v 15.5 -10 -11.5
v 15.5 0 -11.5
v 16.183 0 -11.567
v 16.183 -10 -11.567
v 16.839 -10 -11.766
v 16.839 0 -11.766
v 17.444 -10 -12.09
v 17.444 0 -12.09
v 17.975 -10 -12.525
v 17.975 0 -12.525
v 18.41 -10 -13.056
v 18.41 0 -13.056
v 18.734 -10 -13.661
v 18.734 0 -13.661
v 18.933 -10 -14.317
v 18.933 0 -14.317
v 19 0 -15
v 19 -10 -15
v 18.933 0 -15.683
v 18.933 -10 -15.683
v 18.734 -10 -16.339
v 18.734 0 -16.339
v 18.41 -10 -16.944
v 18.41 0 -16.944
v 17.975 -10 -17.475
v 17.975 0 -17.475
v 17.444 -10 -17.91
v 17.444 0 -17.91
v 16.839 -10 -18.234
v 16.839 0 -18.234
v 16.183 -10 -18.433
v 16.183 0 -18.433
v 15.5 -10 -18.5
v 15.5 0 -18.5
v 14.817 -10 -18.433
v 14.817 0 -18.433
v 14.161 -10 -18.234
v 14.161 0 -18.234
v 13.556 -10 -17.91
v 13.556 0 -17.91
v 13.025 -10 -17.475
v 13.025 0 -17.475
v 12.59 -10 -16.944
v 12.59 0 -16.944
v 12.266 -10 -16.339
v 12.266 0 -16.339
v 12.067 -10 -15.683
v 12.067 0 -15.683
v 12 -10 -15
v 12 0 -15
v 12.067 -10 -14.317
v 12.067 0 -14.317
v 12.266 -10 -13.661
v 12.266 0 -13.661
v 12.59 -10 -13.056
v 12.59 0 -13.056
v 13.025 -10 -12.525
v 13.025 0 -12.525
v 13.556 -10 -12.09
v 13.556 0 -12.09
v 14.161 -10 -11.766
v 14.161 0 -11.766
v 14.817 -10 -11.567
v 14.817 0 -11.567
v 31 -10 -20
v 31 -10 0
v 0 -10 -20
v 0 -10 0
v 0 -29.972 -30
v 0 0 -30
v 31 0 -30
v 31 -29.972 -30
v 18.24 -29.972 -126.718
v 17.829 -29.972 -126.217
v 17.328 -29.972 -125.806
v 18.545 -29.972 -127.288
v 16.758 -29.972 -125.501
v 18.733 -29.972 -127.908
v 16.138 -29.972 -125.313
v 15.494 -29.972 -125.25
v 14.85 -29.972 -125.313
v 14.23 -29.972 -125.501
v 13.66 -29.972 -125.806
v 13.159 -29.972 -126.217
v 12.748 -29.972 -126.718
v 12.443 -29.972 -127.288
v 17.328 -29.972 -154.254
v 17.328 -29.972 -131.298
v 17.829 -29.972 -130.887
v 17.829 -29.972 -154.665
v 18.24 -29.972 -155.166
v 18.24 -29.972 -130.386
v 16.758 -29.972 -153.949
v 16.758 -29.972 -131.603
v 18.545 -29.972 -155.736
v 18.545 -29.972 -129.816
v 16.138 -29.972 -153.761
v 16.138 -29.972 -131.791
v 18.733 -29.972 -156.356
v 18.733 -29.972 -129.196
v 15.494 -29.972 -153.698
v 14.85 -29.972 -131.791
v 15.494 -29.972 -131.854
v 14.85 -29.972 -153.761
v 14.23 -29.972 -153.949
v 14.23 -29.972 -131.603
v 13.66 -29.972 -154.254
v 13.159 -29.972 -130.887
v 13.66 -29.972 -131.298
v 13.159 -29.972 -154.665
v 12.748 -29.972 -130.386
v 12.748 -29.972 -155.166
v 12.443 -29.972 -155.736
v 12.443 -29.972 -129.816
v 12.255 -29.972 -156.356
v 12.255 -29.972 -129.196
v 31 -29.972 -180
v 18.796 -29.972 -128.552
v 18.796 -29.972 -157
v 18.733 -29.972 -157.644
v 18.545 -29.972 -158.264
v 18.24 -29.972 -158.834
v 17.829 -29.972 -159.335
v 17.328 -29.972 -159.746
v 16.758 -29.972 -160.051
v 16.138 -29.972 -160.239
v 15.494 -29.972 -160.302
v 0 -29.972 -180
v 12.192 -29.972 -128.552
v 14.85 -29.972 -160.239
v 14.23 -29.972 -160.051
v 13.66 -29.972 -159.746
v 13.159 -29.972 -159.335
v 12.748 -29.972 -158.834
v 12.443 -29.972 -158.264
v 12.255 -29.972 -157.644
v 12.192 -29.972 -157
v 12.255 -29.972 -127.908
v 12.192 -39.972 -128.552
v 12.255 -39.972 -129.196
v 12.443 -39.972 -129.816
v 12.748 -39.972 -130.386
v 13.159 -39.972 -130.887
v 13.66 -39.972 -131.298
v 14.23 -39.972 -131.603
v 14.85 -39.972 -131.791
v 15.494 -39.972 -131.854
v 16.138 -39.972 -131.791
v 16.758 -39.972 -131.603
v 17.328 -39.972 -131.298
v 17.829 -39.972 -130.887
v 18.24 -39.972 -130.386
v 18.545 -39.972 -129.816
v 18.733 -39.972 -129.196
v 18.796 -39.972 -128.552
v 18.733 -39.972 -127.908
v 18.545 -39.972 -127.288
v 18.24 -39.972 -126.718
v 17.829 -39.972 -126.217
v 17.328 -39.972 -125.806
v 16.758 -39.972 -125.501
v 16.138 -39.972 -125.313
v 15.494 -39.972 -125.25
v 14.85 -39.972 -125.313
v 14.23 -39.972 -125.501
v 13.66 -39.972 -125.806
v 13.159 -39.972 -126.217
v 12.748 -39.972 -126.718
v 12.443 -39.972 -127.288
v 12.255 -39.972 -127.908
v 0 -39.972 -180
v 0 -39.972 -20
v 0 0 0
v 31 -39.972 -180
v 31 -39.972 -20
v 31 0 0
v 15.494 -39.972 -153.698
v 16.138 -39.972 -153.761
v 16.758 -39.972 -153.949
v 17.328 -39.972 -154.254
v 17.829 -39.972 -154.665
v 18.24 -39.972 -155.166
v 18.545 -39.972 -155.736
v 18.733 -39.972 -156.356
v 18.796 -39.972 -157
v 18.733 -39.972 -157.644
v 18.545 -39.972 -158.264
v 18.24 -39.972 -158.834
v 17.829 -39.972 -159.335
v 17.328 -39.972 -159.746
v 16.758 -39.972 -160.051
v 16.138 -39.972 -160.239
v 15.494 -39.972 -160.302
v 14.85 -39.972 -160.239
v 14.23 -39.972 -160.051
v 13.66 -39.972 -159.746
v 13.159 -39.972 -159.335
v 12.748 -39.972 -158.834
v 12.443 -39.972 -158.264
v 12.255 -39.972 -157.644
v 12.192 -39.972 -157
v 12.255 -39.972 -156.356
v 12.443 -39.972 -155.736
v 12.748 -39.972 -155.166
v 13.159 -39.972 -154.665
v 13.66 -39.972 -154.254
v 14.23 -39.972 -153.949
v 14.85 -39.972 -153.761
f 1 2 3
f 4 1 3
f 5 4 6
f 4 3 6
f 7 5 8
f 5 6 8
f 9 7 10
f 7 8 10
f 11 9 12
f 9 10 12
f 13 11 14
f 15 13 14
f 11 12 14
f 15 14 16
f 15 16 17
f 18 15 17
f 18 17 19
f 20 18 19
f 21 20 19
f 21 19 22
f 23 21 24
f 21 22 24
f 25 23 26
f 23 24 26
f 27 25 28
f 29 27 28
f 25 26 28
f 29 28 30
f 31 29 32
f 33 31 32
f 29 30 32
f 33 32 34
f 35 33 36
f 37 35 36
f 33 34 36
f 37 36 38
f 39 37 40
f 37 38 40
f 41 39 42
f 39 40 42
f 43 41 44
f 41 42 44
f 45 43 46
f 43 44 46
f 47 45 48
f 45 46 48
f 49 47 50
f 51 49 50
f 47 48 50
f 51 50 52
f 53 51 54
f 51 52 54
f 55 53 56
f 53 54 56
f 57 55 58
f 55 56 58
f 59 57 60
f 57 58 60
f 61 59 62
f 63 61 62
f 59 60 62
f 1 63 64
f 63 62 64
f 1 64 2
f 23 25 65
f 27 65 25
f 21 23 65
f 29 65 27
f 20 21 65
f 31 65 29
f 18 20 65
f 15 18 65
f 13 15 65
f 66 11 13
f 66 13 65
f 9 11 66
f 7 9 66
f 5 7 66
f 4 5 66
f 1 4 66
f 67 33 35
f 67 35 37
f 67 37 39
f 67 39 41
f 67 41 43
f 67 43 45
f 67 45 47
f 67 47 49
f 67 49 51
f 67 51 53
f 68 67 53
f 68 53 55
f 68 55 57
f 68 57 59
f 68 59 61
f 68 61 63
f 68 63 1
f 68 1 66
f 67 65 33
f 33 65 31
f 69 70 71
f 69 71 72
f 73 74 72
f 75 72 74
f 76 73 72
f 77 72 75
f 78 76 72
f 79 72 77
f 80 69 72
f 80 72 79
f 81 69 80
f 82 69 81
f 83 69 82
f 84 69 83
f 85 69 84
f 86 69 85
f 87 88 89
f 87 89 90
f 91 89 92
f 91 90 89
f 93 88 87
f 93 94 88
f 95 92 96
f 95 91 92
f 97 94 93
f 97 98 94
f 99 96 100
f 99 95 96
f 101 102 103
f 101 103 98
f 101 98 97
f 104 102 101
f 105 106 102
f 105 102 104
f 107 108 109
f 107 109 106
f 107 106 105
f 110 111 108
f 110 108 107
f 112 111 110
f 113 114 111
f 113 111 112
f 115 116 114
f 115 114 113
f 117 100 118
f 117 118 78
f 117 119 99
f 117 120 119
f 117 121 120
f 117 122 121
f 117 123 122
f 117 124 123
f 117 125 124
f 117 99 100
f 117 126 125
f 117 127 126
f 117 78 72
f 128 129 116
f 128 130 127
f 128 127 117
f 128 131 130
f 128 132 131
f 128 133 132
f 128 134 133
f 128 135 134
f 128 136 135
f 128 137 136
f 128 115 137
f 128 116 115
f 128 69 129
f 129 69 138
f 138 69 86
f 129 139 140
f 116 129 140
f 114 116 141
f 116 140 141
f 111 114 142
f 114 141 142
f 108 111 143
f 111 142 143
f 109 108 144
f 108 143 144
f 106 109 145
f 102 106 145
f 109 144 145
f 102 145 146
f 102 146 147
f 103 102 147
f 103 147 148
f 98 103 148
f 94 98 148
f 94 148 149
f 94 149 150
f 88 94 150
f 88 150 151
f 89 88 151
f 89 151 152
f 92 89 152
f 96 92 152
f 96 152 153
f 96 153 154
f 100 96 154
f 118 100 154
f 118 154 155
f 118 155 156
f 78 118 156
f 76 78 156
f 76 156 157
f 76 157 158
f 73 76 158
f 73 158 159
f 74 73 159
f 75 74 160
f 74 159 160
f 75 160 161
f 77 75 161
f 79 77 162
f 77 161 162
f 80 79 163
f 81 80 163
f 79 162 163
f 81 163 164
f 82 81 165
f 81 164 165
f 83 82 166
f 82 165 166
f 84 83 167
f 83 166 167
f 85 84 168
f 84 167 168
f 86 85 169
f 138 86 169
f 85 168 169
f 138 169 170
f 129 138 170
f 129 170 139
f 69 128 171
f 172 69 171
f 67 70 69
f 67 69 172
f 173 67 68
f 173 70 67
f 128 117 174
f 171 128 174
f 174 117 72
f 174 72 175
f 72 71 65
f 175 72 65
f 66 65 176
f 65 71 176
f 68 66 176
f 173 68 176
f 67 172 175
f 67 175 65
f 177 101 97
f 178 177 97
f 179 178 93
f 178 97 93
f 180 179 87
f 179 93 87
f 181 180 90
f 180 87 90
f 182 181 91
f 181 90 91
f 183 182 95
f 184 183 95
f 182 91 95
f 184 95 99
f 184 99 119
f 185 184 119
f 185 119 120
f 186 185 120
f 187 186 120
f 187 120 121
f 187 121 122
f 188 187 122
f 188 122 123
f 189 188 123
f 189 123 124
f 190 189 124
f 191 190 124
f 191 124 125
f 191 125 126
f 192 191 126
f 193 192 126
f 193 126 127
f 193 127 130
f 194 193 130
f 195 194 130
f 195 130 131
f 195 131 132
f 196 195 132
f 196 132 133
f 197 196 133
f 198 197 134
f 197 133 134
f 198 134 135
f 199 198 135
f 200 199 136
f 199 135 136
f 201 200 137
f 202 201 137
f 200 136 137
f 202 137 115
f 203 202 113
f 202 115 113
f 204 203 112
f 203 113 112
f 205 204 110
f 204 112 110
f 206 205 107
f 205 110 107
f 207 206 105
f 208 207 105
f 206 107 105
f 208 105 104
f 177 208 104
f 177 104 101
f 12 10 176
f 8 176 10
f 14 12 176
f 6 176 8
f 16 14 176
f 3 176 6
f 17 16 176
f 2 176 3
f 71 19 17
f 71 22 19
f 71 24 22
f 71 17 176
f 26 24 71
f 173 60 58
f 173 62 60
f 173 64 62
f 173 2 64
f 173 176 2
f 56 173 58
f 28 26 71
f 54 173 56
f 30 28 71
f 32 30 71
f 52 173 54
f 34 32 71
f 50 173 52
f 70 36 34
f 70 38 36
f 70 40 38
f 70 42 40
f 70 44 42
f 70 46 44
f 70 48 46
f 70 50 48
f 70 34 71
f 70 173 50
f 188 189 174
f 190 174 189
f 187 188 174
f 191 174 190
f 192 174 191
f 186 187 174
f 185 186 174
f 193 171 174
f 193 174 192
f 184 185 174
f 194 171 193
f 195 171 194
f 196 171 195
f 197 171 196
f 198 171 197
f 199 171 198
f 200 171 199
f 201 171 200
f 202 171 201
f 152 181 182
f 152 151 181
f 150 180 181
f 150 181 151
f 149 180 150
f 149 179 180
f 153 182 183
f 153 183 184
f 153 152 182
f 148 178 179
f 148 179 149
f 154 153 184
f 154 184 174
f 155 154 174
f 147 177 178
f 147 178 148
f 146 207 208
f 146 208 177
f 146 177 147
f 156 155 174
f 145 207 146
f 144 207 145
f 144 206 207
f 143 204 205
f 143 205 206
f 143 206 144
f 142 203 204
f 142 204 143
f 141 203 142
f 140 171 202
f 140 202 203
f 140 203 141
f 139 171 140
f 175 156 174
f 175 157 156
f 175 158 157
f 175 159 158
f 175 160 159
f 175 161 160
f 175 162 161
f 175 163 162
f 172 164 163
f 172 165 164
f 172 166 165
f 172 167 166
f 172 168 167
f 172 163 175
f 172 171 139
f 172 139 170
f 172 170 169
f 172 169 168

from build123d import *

# Parameters (mm, degrees)
EXTRUDE_THIN1_DEPTH            = 31
SKETCH6_R                      = 3.5
CUT_EXTRUDE1_DEPTH             = 10
SKETCH7_R                      = 3.302
CUT_EXTRUDE3_DEPTH             = 10.16
F_97_0_26_DIAMETER_HOLE1_D     = 6.604
F_97_0_26_DIAMETER_HOLE1_DEPTH = 25.4
F_97_0_26_DIAMETER_HOLE1_TIP   = 1.984041764


with BuildPart() as part:
    # Sketch1 → Extrude-Thin1 (new body)
    with BuildSketch(Plane(origin=(0, 0, 0), x_dir=(0, 0, -1), z_dir=(1, 0, 0))):
        Polygon((0, 0), (30, 0), (30, -29.972), (180, -29.972), (180, -39.972), (20, -39.972), (20, -10), (0, -10), align=None)
    extrude(amount=EXTRUDE_THIN1_DEPTH)

    # Sketch6 → Cut-Extrude1 (cut)
    with BuildSketch(Plane(origin=(0, 0, 0), x_dir=(1, 0, 0), z_dir=(0, 1, 0))):
        with Locations(Location((15.5, 15, 0), (0, 0, 270))):
            Circle(SKETCH6_R)
    extrude(amount=-CUT_EXTRUDE1_DEPTH, mode=Mode.SUBTRACT)

    # Sketch7 → Cut-Extrude3 (cut)
    with BuildSketch(Plane(origin=(0, -29.972, 0), x_dir=(1, 0, 0), z_dir=(0, 1, 0))):
        with Locations(Location((15.494, 157, 0), (0, 0, 270))):
            Circle(SKETCH7_R)
    extrude(amount=-CUT_EXTRUDE3_DEPTH, mode=Mode.SUBTRACT)

    # #97 (0.26) Diameter Hole1
    with Locations(Plane(origin=(0, -29.972, 0), x_dir=(1, 0, 0), z_dir=(0, 1, 0))):
        with Locations((15.494, 128.552)):
            Hole(F_97_0_26_DIAMETER_HOLE1_D / 2, depth=F_97_0_26_DIAMETER_HOLE1_DEPTH)
            with Locations((0, 0, -(F_97_0_26_DIAMETER_HOLE1_DEPTH + F_97_0_26_DIAMETER_HOLE1_TIP / 2))):  # 118° drill point
                Cone(0, F_97_0_26_DIAMETER_HOLE1_D / 2, F_97_0_26_DIAMETER_HOLE1_TIP, mode=Mode.SUBTRACT)


solid = part.part
